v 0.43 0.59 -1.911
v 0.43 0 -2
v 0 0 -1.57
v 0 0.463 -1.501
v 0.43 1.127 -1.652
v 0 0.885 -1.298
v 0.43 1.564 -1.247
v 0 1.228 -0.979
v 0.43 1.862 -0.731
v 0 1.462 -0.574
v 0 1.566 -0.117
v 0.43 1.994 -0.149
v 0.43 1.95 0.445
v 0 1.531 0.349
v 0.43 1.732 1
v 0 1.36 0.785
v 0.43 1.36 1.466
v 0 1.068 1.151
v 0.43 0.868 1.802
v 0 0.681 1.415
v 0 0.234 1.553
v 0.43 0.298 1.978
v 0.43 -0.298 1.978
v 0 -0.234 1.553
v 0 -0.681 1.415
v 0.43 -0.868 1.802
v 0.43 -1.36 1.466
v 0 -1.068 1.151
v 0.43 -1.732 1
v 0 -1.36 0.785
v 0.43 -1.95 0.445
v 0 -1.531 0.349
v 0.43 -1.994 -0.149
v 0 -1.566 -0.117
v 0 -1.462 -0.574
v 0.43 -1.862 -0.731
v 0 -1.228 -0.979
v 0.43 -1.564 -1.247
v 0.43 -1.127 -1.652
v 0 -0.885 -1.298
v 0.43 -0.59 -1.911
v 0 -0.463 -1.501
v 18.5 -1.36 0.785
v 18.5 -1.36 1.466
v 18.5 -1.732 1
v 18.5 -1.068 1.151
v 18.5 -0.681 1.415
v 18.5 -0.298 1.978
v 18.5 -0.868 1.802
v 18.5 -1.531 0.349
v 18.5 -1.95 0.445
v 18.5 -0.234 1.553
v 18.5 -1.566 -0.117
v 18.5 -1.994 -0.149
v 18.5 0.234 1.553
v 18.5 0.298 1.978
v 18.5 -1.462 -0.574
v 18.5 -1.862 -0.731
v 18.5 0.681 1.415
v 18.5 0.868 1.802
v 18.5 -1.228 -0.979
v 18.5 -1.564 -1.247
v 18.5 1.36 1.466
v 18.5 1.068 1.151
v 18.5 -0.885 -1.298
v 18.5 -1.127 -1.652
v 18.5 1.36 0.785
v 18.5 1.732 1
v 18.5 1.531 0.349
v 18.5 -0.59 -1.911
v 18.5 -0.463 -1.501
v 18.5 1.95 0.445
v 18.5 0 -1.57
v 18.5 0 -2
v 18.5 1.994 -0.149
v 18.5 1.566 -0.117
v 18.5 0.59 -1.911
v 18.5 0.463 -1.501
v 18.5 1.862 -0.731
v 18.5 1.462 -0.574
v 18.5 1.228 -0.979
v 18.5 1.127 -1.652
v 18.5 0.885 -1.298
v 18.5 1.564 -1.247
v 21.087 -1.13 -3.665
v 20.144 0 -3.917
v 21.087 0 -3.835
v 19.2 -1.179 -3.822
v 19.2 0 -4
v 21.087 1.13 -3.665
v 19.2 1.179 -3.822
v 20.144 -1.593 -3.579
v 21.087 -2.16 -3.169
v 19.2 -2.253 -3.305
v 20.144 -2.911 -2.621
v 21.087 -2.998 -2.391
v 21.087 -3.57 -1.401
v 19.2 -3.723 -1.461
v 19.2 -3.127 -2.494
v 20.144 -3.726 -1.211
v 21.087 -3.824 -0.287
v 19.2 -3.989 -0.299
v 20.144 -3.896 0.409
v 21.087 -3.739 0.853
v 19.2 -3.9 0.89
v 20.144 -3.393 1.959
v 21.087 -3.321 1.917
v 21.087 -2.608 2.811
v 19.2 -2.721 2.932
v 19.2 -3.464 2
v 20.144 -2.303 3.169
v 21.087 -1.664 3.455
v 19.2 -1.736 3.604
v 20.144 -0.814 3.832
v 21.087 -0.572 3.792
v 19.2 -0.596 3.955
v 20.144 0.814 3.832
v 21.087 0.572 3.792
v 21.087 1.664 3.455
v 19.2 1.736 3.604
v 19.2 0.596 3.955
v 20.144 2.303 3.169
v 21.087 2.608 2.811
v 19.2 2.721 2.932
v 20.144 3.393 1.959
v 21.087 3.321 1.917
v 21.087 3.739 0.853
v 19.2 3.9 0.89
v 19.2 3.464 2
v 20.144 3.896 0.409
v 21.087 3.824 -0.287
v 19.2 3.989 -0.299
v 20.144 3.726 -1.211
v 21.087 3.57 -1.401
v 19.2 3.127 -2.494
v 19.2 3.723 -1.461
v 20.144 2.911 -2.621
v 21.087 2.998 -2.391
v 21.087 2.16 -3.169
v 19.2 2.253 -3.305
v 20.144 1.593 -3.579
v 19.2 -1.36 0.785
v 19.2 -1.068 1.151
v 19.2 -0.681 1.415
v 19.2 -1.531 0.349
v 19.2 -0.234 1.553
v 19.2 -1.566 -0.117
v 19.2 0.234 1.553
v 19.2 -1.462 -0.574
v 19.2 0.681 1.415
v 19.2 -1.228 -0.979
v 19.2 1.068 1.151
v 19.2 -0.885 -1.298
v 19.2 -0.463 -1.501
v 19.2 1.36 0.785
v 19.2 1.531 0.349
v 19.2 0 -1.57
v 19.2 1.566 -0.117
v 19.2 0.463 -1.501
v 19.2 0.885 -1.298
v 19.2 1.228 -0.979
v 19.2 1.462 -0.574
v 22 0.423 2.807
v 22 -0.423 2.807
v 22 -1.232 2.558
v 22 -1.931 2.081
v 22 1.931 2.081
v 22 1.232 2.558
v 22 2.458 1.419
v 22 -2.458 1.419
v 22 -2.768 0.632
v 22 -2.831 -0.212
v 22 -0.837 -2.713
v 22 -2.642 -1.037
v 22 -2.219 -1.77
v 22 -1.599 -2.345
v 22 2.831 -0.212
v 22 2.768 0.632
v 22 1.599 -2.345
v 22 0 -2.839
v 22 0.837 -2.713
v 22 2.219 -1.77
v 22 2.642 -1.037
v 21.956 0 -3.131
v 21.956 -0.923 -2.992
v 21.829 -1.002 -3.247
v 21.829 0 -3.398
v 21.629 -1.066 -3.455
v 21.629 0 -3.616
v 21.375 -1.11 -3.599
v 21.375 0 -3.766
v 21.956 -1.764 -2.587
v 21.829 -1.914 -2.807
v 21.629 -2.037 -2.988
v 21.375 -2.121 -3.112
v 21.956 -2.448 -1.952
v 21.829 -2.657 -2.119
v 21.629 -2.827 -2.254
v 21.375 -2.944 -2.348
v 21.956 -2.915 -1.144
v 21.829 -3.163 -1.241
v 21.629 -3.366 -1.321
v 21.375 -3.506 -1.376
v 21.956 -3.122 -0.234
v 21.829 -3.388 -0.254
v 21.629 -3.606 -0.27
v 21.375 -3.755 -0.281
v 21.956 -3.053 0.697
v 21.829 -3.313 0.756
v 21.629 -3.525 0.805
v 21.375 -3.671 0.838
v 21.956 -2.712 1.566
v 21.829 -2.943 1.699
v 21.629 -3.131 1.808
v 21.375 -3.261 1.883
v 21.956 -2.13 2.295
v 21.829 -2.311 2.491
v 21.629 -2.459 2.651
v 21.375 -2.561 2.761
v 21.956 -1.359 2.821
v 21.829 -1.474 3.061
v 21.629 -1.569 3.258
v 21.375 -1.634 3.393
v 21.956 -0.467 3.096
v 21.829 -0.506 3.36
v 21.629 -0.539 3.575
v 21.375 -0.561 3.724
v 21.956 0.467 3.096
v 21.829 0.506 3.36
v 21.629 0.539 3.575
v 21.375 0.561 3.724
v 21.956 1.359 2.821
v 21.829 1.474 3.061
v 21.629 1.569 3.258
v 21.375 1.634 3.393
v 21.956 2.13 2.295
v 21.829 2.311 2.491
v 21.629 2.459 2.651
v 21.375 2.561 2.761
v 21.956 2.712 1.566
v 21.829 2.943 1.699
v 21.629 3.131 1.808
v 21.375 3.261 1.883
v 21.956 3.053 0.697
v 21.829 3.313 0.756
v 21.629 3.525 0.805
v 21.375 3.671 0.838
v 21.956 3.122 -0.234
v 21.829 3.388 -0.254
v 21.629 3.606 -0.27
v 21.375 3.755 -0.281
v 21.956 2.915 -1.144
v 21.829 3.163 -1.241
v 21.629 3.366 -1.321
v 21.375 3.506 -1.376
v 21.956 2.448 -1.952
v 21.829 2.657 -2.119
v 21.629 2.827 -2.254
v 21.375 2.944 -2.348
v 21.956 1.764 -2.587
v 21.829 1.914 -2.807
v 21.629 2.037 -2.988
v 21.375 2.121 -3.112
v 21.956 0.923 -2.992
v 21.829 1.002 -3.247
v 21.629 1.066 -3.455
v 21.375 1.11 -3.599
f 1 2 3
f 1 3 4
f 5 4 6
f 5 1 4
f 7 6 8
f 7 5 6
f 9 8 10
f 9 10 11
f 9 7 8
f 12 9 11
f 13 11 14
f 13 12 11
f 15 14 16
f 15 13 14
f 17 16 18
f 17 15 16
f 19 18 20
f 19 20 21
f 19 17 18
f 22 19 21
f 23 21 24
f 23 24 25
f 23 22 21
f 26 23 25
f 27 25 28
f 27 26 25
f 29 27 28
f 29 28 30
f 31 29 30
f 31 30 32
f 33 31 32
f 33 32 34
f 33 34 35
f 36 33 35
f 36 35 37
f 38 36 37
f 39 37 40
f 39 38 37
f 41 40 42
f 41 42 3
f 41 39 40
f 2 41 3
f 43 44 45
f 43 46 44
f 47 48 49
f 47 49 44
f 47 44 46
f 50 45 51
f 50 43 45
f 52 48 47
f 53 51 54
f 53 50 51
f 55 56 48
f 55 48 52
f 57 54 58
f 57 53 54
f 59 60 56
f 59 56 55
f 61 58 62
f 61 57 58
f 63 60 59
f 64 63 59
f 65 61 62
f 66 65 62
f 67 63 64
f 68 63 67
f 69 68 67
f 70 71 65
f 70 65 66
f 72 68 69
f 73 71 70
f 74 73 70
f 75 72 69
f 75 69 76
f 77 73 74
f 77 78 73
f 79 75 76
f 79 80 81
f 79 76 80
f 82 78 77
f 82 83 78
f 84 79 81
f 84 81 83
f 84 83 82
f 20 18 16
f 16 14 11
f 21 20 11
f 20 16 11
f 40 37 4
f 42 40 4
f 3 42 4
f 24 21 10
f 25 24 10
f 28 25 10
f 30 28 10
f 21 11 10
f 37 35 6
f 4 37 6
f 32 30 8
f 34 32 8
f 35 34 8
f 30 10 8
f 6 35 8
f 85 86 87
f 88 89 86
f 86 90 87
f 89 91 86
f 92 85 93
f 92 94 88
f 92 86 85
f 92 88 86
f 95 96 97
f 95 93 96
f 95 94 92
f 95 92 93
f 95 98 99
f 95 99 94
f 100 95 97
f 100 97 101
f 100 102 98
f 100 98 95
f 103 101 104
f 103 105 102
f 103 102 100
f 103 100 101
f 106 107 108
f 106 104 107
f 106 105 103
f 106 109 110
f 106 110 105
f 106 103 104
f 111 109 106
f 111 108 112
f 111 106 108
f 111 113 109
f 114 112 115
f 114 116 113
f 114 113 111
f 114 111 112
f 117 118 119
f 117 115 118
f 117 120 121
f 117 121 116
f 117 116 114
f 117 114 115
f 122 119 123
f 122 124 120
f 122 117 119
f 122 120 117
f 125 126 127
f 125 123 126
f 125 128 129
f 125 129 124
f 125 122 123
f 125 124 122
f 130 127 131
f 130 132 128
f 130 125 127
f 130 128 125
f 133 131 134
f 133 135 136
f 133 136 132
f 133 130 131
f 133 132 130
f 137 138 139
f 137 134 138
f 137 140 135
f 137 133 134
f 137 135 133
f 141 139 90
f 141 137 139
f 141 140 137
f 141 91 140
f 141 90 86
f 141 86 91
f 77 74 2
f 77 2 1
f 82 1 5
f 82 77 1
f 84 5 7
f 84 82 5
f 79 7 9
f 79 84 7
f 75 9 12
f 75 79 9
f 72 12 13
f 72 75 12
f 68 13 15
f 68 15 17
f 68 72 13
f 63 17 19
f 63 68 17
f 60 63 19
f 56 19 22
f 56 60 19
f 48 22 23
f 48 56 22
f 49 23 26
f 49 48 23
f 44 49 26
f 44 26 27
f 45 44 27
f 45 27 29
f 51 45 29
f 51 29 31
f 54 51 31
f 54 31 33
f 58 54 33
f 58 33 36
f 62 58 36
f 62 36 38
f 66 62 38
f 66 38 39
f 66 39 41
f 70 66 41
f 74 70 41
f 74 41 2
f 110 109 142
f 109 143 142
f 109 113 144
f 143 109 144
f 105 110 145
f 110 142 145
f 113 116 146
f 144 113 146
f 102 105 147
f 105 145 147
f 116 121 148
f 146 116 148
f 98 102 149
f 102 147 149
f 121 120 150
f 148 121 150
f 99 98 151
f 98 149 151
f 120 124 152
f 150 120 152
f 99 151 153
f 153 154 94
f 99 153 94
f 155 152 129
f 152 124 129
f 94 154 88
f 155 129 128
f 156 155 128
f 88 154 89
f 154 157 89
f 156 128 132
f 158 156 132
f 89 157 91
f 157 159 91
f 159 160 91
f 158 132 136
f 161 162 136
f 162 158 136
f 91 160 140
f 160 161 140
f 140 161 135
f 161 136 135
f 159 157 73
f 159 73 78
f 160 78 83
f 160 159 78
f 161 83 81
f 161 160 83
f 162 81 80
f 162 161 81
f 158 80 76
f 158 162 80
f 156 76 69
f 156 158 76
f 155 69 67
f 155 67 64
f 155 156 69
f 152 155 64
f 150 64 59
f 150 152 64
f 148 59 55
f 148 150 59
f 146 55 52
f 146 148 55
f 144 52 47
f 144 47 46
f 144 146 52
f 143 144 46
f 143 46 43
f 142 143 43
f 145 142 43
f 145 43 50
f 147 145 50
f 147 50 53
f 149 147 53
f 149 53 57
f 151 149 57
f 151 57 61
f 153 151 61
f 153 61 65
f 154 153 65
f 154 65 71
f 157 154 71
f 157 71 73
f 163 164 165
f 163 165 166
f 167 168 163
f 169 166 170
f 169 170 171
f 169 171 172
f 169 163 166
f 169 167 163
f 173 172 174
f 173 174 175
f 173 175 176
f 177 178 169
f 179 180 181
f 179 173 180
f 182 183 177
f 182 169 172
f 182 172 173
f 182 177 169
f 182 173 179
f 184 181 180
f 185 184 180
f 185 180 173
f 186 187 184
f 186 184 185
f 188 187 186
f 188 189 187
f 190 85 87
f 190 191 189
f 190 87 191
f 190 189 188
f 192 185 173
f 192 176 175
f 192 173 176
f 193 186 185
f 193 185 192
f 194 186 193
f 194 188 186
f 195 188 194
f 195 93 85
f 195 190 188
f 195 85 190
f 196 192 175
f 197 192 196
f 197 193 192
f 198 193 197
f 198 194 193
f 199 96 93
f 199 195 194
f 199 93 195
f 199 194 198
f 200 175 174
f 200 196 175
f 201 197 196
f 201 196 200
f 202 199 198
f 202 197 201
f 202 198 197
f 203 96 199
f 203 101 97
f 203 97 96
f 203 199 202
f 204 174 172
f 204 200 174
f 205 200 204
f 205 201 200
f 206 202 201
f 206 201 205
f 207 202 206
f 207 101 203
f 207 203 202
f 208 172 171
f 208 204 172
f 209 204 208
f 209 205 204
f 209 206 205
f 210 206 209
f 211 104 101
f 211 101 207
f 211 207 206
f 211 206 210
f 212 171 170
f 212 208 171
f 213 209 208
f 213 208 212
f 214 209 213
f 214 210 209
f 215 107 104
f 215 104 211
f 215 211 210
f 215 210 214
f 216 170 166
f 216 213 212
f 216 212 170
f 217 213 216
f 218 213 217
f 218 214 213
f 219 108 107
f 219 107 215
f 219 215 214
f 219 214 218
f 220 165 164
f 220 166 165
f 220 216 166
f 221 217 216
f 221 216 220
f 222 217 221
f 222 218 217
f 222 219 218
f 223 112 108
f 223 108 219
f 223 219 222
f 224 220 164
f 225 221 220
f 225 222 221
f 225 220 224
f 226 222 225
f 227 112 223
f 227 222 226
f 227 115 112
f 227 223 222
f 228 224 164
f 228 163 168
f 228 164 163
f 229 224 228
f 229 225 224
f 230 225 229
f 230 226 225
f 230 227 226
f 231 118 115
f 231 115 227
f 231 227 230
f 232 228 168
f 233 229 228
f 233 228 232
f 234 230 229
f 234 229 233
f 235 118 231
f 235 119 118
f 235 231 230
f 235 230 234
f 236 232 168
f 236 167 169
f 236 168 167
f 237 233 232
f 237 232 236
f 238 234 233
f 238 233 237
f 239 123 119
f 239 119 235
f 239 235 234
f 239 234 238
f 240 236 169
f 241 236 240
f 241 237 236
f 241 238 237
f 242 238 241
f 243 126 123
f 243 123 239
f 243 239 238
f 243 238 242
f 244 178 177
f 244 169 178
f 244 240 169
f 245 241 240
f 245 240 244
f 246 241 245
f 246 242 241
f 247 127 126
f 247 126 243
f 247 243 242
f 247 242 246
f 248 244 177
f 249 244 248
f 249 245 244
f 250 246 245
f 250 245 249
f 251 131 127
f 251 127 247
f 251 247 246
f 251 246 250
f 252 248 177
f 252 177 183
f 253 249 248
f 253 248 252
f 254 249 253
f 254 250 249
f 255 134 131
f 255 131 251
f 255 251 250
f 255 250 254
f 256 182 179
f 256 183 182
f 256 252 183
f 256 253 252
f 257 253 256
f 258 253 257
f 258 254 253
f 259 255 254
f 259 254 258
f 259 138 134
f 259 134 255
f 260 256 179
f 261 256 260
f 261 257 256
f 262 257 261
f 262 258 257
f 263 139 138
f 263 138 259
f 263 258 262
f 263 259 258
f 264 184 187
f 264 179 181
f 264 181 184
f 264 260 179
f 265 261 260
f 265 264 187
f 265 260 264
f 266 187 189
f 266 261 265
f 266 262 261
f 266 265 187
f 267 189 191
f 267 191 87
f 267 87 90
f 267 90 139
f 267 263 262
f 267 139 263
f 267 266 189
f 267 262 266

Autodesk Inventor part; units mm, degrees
sketch "Skizze_1" plane through (0, 0, 0) normal (0, 1, 0) x (-1, 0, 0)
  line L0 (-22, 0) -> (0, 0)
  line L1 (0, 0) -> (0, -1.5705)
  line L2 (0, -1.5705) -> (-0.4295, -2)
  line L3 (-0.4295, -2) -> (-18.5, -2)
  line L4 (-18.5, -2) -> (-18.5, -1.5705)
  line L5 (-18.5, -1.5705) -> (-19.2, -1.5705)
  line L6 (-19.2, -1.5705) -> (-19.2, -4)
  line L7 (-19.2, -4) -> (-21.0872, -3.8349)
  arc A0 (-22, -2.8387) -> (-21.0872, -3.8349) centre (-21, -2.8387) ccw
  line L8 (-22, -2.8387) -> (-22, 0)
  line L9 (-22, 0) -> (0, 0)
revolve "Revolution1" add sketch "Skizze_1" angle 360 about axis through (22, 0, 0) along (1, 0, 0)
thread "Thread1" size "M4x0.7" class "6g" standard "ISO Metric profile" length 17.0705
ref_plane "AS_XY" through (10.92, 0, 0) normal (1, 0, 0) x (0, 0, -1)
ref_plane "AS_YZ" through (10.92, 0, 0) normal (0, 0, -1) x (0, 1, 0)
ref_plane "AS_ZX" through (10.92, 0, 0) normal (0, 1, 0) x (1, 0, 0)
properties part number "205-S-AS"
